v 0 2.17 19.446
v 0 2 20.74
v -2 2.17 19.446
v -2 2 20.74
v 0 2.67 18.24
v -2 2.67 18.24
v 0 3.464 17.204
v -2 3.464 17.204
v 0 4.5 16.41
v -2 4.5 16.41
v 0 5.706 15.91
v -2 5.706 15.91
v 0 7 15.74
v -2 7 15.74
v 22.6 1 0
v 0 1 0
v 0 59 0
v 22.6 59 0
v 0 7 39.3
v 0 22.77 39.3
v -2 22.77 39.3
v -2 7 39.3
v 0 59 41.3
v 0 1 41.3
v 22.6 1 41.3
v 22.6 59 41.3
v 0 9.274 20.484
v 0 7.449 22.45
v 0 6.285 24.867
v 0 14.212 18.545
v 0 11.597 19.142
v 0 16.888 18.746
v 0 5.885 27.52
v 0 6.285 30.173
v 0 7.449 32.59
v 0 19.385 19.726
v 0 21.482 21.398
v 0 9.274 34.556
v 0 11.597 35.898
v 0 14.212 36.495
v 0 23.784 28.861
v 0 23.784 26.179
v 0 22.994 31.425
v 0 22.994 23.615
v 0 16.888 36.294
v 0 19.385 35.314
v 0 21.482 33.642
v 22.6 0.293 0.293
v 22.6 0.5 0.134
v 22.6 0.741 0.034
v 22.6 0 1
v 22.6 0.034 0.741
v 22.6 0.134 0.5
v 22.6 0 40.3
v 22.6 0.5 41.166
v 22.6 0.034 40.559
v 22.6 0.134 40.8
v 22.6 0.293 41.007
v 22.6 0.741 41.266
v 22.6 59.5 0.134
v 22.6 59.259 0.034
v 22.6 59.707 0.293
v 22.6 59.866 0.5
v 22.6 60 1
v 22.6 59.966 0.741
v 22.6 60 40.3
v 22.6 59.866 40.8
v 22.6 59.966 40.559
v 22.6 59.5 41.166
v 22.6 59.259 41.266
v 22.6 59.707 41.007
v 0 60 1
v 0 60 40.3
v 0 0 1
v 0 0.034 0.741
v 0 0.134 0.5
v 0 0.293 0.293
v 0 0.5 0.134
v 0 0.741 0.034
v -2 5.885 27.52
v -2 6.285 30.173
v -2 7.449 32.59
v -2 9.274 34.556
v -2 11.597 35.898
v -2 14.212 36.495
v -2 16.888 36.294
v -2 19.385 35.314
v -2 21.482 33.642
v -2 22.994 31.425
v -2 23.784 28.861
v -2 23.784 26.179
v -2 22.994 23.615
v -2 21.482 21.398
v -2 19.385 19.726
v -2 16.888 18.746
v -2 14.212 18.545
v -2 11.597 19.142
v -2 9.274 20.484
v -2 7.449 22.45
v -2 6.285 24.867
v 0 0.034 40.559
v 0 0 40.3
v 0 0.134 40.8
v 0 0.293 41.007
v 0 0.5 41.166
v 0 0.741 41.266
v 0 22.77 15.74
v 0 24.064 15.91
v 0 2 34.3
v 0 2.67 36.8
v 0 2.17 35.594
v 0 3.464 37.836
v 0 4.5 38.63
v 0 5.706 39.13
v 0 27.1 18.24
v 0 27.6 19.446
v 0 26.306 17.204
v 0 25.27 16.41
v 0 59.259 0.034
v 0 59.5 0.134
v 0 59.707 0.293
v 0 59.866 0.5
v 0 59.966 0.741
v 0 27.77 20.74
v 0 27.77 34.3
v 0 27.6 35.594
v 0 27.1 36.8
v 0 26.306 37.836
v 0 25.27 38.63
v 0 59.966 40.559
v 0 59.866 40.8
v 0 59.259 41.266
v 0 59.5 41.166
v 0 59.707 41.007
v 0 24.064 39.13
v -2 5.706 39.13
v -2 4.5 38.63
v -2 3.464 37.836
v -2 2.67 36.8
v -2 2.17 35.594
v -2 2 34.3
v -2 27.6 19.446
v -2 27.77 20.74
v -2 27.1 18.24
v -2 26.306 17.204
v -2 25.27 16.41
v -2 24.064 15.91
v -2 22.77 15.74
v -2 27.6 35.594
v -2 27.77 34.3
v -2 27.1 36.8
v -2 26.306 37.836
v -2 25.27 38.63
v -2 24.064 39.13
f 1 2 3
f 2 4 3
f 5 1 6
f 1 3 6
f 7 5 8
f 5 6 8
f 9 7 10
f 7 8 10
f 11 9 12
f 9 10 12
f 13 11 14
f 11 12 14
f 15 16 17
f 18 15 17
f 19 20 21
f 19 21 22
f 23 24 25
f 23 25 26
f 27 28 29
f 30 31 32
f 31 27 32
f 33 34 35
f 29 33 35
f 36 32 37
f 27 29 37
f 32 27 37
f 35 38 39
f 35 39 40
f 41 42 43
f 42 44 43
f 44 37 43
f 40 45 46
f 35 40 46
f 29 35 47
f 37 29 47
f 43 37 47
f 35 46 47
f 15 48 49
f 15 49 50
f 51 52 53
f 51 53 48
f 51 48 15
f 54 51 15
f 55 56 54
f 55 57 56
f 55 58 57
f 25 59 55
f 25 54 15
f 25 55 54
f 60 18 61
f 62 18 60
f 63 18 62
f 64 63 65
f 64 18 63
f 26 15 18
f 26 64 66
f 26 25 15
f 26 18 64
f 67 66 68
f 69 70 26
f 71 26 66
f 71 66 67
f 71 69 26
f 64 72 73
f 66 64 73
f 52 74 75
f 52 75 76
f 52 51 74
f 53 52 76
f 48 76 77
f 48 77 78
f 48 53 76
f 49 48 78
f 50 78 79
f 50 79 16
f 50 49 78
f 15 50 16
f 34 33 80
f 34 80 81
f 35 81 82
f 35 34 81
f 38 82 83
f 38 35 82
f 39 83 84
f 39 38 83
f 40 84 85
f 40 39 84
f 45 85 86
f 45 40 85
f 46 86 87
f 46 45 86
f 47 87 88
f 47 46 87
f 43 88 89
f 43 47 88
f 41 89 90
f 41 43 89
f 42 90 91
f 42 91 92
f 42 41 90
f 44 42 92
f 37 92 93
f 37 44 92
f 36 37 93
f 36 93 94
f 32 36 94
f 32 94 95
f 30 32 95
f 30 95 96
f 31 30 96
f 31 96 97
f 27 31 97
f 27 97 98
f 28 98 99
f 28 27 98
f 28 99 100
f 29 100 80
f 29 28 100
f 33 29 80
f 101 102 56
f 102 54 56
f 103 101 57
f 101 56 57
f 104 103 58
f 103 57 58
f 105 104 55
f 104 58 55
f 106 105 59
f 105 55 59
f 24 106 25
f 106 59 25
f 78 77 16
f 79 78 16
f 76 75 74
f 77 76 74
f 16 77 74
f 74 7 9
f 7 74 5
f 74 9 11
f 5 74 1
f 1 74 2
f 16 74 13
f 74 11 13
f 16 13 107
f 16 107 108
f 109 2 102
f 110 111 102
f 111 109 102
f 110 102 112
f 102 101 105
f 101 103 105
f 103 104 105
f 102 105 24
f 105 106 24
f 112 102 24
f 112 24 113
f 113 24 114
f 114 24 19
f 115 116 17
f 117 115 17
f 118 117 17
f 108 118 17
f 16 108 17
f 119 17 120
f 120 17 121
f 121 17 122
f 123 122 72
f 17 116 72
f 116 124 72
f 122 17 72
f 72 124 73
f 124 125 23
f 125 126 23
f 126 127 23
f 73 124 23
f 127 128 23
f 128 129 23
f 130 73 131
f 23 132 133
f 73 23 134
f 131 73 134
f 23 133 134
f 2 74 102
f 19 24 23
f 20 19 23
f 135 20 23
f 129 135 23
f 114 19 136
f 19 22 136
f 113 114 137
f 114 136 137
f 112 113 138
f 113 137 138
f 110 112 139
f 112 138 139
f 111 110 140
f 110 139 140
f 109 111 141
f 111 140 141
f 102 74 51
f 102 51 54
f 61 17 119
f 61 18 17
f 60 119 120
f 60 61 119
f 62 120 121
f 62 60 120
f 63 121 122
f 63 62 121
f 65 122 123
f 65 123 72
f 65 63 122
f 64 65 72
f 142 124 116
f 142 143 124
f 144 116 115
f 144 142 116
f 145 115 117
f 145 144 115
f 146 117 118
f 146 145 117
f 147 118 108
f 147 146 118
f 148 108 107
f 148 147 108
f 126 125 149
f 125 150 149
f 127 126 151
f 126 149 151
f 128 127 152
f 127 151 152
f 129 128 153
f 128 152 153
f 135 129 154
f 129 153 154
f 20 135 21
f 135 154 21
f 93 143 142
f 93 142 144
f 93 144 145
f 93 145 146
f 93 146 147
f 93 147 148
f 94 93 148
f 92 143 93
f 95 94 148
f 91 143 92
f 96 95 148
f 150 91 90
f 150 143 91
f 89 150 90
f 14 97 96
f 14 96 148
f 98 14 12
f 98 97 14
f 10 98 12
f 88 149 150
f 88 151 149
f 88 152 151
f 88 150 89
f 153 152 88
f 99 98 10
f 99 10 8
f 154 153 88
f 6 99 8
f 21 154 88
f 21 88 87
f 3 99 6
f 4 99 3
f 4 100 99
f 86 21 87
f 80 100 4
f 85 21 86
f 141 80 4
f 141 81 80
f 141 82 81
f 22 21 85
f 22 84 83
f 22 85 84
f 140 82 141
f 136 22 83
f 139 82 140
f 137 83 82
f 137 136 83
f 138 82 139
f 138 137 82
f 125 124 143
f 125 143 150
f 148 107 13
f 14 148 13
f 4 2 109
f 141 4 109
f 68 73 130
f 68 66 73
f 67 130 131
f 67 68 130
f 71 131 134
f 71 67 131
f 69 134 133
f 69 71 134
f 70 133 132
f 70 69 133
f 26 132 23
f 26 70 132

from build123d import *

# Parameters (mm, degrees)
F0_W     = 60
F0_H     = 41.3
F1_DEPTH = 22.6
F2_R     = 1
F3_W     = 25.77
F3_H     = 23.56
F3_R     = 9
F4_DEPTH = 2
F5_R     = 5


with BuildPart() as f1:
    # F0 (on Right) → F1 (new body)
    with BuildSketch(Plane.YZ):
        with Locations((30, 20.65)):
            Rectangle(F0_W, F0_H)
    extrude(amount=F1_DEPTH)

    # F2
    f2_edges = [f1.edges().sort_by_distance(p)[0] for p in [
        (11.3, 60, 41.3),
        (11.3, 0, 41.3),
        (11.3, 0, 0),
        (11.3, 60, 0),
    ]]
    fillet(f2_edges, radius=F2_R)

    # F3 (on face) → F4 (join)
    with BuildSketch(Plane(origin=(0, 0, 0), x_dir=(0, -1, 0), z_dir=(-1, 0, 0))):
        with Locations((-14.885, 27.52)):
            Rectangle(F3_W, F3_H)
        with Locations((-14.885, 27.52)):
            Circle(F3_R, mode=Mode.SUBTRACT)
    extrude(amount=F4_DEPTH)

    # F5
    f5_edges = [f1.edges().sort_by_distance(p)[0] for p in [
        (-1, 2, 39.3),
        (-1, 2, 15.74),
        (-1, 27.77, 15.74),
        (-1, 27.77, 39.3),
    ]]
    fillet(f5_edges, radius=F5_R)


solid = f1.part
